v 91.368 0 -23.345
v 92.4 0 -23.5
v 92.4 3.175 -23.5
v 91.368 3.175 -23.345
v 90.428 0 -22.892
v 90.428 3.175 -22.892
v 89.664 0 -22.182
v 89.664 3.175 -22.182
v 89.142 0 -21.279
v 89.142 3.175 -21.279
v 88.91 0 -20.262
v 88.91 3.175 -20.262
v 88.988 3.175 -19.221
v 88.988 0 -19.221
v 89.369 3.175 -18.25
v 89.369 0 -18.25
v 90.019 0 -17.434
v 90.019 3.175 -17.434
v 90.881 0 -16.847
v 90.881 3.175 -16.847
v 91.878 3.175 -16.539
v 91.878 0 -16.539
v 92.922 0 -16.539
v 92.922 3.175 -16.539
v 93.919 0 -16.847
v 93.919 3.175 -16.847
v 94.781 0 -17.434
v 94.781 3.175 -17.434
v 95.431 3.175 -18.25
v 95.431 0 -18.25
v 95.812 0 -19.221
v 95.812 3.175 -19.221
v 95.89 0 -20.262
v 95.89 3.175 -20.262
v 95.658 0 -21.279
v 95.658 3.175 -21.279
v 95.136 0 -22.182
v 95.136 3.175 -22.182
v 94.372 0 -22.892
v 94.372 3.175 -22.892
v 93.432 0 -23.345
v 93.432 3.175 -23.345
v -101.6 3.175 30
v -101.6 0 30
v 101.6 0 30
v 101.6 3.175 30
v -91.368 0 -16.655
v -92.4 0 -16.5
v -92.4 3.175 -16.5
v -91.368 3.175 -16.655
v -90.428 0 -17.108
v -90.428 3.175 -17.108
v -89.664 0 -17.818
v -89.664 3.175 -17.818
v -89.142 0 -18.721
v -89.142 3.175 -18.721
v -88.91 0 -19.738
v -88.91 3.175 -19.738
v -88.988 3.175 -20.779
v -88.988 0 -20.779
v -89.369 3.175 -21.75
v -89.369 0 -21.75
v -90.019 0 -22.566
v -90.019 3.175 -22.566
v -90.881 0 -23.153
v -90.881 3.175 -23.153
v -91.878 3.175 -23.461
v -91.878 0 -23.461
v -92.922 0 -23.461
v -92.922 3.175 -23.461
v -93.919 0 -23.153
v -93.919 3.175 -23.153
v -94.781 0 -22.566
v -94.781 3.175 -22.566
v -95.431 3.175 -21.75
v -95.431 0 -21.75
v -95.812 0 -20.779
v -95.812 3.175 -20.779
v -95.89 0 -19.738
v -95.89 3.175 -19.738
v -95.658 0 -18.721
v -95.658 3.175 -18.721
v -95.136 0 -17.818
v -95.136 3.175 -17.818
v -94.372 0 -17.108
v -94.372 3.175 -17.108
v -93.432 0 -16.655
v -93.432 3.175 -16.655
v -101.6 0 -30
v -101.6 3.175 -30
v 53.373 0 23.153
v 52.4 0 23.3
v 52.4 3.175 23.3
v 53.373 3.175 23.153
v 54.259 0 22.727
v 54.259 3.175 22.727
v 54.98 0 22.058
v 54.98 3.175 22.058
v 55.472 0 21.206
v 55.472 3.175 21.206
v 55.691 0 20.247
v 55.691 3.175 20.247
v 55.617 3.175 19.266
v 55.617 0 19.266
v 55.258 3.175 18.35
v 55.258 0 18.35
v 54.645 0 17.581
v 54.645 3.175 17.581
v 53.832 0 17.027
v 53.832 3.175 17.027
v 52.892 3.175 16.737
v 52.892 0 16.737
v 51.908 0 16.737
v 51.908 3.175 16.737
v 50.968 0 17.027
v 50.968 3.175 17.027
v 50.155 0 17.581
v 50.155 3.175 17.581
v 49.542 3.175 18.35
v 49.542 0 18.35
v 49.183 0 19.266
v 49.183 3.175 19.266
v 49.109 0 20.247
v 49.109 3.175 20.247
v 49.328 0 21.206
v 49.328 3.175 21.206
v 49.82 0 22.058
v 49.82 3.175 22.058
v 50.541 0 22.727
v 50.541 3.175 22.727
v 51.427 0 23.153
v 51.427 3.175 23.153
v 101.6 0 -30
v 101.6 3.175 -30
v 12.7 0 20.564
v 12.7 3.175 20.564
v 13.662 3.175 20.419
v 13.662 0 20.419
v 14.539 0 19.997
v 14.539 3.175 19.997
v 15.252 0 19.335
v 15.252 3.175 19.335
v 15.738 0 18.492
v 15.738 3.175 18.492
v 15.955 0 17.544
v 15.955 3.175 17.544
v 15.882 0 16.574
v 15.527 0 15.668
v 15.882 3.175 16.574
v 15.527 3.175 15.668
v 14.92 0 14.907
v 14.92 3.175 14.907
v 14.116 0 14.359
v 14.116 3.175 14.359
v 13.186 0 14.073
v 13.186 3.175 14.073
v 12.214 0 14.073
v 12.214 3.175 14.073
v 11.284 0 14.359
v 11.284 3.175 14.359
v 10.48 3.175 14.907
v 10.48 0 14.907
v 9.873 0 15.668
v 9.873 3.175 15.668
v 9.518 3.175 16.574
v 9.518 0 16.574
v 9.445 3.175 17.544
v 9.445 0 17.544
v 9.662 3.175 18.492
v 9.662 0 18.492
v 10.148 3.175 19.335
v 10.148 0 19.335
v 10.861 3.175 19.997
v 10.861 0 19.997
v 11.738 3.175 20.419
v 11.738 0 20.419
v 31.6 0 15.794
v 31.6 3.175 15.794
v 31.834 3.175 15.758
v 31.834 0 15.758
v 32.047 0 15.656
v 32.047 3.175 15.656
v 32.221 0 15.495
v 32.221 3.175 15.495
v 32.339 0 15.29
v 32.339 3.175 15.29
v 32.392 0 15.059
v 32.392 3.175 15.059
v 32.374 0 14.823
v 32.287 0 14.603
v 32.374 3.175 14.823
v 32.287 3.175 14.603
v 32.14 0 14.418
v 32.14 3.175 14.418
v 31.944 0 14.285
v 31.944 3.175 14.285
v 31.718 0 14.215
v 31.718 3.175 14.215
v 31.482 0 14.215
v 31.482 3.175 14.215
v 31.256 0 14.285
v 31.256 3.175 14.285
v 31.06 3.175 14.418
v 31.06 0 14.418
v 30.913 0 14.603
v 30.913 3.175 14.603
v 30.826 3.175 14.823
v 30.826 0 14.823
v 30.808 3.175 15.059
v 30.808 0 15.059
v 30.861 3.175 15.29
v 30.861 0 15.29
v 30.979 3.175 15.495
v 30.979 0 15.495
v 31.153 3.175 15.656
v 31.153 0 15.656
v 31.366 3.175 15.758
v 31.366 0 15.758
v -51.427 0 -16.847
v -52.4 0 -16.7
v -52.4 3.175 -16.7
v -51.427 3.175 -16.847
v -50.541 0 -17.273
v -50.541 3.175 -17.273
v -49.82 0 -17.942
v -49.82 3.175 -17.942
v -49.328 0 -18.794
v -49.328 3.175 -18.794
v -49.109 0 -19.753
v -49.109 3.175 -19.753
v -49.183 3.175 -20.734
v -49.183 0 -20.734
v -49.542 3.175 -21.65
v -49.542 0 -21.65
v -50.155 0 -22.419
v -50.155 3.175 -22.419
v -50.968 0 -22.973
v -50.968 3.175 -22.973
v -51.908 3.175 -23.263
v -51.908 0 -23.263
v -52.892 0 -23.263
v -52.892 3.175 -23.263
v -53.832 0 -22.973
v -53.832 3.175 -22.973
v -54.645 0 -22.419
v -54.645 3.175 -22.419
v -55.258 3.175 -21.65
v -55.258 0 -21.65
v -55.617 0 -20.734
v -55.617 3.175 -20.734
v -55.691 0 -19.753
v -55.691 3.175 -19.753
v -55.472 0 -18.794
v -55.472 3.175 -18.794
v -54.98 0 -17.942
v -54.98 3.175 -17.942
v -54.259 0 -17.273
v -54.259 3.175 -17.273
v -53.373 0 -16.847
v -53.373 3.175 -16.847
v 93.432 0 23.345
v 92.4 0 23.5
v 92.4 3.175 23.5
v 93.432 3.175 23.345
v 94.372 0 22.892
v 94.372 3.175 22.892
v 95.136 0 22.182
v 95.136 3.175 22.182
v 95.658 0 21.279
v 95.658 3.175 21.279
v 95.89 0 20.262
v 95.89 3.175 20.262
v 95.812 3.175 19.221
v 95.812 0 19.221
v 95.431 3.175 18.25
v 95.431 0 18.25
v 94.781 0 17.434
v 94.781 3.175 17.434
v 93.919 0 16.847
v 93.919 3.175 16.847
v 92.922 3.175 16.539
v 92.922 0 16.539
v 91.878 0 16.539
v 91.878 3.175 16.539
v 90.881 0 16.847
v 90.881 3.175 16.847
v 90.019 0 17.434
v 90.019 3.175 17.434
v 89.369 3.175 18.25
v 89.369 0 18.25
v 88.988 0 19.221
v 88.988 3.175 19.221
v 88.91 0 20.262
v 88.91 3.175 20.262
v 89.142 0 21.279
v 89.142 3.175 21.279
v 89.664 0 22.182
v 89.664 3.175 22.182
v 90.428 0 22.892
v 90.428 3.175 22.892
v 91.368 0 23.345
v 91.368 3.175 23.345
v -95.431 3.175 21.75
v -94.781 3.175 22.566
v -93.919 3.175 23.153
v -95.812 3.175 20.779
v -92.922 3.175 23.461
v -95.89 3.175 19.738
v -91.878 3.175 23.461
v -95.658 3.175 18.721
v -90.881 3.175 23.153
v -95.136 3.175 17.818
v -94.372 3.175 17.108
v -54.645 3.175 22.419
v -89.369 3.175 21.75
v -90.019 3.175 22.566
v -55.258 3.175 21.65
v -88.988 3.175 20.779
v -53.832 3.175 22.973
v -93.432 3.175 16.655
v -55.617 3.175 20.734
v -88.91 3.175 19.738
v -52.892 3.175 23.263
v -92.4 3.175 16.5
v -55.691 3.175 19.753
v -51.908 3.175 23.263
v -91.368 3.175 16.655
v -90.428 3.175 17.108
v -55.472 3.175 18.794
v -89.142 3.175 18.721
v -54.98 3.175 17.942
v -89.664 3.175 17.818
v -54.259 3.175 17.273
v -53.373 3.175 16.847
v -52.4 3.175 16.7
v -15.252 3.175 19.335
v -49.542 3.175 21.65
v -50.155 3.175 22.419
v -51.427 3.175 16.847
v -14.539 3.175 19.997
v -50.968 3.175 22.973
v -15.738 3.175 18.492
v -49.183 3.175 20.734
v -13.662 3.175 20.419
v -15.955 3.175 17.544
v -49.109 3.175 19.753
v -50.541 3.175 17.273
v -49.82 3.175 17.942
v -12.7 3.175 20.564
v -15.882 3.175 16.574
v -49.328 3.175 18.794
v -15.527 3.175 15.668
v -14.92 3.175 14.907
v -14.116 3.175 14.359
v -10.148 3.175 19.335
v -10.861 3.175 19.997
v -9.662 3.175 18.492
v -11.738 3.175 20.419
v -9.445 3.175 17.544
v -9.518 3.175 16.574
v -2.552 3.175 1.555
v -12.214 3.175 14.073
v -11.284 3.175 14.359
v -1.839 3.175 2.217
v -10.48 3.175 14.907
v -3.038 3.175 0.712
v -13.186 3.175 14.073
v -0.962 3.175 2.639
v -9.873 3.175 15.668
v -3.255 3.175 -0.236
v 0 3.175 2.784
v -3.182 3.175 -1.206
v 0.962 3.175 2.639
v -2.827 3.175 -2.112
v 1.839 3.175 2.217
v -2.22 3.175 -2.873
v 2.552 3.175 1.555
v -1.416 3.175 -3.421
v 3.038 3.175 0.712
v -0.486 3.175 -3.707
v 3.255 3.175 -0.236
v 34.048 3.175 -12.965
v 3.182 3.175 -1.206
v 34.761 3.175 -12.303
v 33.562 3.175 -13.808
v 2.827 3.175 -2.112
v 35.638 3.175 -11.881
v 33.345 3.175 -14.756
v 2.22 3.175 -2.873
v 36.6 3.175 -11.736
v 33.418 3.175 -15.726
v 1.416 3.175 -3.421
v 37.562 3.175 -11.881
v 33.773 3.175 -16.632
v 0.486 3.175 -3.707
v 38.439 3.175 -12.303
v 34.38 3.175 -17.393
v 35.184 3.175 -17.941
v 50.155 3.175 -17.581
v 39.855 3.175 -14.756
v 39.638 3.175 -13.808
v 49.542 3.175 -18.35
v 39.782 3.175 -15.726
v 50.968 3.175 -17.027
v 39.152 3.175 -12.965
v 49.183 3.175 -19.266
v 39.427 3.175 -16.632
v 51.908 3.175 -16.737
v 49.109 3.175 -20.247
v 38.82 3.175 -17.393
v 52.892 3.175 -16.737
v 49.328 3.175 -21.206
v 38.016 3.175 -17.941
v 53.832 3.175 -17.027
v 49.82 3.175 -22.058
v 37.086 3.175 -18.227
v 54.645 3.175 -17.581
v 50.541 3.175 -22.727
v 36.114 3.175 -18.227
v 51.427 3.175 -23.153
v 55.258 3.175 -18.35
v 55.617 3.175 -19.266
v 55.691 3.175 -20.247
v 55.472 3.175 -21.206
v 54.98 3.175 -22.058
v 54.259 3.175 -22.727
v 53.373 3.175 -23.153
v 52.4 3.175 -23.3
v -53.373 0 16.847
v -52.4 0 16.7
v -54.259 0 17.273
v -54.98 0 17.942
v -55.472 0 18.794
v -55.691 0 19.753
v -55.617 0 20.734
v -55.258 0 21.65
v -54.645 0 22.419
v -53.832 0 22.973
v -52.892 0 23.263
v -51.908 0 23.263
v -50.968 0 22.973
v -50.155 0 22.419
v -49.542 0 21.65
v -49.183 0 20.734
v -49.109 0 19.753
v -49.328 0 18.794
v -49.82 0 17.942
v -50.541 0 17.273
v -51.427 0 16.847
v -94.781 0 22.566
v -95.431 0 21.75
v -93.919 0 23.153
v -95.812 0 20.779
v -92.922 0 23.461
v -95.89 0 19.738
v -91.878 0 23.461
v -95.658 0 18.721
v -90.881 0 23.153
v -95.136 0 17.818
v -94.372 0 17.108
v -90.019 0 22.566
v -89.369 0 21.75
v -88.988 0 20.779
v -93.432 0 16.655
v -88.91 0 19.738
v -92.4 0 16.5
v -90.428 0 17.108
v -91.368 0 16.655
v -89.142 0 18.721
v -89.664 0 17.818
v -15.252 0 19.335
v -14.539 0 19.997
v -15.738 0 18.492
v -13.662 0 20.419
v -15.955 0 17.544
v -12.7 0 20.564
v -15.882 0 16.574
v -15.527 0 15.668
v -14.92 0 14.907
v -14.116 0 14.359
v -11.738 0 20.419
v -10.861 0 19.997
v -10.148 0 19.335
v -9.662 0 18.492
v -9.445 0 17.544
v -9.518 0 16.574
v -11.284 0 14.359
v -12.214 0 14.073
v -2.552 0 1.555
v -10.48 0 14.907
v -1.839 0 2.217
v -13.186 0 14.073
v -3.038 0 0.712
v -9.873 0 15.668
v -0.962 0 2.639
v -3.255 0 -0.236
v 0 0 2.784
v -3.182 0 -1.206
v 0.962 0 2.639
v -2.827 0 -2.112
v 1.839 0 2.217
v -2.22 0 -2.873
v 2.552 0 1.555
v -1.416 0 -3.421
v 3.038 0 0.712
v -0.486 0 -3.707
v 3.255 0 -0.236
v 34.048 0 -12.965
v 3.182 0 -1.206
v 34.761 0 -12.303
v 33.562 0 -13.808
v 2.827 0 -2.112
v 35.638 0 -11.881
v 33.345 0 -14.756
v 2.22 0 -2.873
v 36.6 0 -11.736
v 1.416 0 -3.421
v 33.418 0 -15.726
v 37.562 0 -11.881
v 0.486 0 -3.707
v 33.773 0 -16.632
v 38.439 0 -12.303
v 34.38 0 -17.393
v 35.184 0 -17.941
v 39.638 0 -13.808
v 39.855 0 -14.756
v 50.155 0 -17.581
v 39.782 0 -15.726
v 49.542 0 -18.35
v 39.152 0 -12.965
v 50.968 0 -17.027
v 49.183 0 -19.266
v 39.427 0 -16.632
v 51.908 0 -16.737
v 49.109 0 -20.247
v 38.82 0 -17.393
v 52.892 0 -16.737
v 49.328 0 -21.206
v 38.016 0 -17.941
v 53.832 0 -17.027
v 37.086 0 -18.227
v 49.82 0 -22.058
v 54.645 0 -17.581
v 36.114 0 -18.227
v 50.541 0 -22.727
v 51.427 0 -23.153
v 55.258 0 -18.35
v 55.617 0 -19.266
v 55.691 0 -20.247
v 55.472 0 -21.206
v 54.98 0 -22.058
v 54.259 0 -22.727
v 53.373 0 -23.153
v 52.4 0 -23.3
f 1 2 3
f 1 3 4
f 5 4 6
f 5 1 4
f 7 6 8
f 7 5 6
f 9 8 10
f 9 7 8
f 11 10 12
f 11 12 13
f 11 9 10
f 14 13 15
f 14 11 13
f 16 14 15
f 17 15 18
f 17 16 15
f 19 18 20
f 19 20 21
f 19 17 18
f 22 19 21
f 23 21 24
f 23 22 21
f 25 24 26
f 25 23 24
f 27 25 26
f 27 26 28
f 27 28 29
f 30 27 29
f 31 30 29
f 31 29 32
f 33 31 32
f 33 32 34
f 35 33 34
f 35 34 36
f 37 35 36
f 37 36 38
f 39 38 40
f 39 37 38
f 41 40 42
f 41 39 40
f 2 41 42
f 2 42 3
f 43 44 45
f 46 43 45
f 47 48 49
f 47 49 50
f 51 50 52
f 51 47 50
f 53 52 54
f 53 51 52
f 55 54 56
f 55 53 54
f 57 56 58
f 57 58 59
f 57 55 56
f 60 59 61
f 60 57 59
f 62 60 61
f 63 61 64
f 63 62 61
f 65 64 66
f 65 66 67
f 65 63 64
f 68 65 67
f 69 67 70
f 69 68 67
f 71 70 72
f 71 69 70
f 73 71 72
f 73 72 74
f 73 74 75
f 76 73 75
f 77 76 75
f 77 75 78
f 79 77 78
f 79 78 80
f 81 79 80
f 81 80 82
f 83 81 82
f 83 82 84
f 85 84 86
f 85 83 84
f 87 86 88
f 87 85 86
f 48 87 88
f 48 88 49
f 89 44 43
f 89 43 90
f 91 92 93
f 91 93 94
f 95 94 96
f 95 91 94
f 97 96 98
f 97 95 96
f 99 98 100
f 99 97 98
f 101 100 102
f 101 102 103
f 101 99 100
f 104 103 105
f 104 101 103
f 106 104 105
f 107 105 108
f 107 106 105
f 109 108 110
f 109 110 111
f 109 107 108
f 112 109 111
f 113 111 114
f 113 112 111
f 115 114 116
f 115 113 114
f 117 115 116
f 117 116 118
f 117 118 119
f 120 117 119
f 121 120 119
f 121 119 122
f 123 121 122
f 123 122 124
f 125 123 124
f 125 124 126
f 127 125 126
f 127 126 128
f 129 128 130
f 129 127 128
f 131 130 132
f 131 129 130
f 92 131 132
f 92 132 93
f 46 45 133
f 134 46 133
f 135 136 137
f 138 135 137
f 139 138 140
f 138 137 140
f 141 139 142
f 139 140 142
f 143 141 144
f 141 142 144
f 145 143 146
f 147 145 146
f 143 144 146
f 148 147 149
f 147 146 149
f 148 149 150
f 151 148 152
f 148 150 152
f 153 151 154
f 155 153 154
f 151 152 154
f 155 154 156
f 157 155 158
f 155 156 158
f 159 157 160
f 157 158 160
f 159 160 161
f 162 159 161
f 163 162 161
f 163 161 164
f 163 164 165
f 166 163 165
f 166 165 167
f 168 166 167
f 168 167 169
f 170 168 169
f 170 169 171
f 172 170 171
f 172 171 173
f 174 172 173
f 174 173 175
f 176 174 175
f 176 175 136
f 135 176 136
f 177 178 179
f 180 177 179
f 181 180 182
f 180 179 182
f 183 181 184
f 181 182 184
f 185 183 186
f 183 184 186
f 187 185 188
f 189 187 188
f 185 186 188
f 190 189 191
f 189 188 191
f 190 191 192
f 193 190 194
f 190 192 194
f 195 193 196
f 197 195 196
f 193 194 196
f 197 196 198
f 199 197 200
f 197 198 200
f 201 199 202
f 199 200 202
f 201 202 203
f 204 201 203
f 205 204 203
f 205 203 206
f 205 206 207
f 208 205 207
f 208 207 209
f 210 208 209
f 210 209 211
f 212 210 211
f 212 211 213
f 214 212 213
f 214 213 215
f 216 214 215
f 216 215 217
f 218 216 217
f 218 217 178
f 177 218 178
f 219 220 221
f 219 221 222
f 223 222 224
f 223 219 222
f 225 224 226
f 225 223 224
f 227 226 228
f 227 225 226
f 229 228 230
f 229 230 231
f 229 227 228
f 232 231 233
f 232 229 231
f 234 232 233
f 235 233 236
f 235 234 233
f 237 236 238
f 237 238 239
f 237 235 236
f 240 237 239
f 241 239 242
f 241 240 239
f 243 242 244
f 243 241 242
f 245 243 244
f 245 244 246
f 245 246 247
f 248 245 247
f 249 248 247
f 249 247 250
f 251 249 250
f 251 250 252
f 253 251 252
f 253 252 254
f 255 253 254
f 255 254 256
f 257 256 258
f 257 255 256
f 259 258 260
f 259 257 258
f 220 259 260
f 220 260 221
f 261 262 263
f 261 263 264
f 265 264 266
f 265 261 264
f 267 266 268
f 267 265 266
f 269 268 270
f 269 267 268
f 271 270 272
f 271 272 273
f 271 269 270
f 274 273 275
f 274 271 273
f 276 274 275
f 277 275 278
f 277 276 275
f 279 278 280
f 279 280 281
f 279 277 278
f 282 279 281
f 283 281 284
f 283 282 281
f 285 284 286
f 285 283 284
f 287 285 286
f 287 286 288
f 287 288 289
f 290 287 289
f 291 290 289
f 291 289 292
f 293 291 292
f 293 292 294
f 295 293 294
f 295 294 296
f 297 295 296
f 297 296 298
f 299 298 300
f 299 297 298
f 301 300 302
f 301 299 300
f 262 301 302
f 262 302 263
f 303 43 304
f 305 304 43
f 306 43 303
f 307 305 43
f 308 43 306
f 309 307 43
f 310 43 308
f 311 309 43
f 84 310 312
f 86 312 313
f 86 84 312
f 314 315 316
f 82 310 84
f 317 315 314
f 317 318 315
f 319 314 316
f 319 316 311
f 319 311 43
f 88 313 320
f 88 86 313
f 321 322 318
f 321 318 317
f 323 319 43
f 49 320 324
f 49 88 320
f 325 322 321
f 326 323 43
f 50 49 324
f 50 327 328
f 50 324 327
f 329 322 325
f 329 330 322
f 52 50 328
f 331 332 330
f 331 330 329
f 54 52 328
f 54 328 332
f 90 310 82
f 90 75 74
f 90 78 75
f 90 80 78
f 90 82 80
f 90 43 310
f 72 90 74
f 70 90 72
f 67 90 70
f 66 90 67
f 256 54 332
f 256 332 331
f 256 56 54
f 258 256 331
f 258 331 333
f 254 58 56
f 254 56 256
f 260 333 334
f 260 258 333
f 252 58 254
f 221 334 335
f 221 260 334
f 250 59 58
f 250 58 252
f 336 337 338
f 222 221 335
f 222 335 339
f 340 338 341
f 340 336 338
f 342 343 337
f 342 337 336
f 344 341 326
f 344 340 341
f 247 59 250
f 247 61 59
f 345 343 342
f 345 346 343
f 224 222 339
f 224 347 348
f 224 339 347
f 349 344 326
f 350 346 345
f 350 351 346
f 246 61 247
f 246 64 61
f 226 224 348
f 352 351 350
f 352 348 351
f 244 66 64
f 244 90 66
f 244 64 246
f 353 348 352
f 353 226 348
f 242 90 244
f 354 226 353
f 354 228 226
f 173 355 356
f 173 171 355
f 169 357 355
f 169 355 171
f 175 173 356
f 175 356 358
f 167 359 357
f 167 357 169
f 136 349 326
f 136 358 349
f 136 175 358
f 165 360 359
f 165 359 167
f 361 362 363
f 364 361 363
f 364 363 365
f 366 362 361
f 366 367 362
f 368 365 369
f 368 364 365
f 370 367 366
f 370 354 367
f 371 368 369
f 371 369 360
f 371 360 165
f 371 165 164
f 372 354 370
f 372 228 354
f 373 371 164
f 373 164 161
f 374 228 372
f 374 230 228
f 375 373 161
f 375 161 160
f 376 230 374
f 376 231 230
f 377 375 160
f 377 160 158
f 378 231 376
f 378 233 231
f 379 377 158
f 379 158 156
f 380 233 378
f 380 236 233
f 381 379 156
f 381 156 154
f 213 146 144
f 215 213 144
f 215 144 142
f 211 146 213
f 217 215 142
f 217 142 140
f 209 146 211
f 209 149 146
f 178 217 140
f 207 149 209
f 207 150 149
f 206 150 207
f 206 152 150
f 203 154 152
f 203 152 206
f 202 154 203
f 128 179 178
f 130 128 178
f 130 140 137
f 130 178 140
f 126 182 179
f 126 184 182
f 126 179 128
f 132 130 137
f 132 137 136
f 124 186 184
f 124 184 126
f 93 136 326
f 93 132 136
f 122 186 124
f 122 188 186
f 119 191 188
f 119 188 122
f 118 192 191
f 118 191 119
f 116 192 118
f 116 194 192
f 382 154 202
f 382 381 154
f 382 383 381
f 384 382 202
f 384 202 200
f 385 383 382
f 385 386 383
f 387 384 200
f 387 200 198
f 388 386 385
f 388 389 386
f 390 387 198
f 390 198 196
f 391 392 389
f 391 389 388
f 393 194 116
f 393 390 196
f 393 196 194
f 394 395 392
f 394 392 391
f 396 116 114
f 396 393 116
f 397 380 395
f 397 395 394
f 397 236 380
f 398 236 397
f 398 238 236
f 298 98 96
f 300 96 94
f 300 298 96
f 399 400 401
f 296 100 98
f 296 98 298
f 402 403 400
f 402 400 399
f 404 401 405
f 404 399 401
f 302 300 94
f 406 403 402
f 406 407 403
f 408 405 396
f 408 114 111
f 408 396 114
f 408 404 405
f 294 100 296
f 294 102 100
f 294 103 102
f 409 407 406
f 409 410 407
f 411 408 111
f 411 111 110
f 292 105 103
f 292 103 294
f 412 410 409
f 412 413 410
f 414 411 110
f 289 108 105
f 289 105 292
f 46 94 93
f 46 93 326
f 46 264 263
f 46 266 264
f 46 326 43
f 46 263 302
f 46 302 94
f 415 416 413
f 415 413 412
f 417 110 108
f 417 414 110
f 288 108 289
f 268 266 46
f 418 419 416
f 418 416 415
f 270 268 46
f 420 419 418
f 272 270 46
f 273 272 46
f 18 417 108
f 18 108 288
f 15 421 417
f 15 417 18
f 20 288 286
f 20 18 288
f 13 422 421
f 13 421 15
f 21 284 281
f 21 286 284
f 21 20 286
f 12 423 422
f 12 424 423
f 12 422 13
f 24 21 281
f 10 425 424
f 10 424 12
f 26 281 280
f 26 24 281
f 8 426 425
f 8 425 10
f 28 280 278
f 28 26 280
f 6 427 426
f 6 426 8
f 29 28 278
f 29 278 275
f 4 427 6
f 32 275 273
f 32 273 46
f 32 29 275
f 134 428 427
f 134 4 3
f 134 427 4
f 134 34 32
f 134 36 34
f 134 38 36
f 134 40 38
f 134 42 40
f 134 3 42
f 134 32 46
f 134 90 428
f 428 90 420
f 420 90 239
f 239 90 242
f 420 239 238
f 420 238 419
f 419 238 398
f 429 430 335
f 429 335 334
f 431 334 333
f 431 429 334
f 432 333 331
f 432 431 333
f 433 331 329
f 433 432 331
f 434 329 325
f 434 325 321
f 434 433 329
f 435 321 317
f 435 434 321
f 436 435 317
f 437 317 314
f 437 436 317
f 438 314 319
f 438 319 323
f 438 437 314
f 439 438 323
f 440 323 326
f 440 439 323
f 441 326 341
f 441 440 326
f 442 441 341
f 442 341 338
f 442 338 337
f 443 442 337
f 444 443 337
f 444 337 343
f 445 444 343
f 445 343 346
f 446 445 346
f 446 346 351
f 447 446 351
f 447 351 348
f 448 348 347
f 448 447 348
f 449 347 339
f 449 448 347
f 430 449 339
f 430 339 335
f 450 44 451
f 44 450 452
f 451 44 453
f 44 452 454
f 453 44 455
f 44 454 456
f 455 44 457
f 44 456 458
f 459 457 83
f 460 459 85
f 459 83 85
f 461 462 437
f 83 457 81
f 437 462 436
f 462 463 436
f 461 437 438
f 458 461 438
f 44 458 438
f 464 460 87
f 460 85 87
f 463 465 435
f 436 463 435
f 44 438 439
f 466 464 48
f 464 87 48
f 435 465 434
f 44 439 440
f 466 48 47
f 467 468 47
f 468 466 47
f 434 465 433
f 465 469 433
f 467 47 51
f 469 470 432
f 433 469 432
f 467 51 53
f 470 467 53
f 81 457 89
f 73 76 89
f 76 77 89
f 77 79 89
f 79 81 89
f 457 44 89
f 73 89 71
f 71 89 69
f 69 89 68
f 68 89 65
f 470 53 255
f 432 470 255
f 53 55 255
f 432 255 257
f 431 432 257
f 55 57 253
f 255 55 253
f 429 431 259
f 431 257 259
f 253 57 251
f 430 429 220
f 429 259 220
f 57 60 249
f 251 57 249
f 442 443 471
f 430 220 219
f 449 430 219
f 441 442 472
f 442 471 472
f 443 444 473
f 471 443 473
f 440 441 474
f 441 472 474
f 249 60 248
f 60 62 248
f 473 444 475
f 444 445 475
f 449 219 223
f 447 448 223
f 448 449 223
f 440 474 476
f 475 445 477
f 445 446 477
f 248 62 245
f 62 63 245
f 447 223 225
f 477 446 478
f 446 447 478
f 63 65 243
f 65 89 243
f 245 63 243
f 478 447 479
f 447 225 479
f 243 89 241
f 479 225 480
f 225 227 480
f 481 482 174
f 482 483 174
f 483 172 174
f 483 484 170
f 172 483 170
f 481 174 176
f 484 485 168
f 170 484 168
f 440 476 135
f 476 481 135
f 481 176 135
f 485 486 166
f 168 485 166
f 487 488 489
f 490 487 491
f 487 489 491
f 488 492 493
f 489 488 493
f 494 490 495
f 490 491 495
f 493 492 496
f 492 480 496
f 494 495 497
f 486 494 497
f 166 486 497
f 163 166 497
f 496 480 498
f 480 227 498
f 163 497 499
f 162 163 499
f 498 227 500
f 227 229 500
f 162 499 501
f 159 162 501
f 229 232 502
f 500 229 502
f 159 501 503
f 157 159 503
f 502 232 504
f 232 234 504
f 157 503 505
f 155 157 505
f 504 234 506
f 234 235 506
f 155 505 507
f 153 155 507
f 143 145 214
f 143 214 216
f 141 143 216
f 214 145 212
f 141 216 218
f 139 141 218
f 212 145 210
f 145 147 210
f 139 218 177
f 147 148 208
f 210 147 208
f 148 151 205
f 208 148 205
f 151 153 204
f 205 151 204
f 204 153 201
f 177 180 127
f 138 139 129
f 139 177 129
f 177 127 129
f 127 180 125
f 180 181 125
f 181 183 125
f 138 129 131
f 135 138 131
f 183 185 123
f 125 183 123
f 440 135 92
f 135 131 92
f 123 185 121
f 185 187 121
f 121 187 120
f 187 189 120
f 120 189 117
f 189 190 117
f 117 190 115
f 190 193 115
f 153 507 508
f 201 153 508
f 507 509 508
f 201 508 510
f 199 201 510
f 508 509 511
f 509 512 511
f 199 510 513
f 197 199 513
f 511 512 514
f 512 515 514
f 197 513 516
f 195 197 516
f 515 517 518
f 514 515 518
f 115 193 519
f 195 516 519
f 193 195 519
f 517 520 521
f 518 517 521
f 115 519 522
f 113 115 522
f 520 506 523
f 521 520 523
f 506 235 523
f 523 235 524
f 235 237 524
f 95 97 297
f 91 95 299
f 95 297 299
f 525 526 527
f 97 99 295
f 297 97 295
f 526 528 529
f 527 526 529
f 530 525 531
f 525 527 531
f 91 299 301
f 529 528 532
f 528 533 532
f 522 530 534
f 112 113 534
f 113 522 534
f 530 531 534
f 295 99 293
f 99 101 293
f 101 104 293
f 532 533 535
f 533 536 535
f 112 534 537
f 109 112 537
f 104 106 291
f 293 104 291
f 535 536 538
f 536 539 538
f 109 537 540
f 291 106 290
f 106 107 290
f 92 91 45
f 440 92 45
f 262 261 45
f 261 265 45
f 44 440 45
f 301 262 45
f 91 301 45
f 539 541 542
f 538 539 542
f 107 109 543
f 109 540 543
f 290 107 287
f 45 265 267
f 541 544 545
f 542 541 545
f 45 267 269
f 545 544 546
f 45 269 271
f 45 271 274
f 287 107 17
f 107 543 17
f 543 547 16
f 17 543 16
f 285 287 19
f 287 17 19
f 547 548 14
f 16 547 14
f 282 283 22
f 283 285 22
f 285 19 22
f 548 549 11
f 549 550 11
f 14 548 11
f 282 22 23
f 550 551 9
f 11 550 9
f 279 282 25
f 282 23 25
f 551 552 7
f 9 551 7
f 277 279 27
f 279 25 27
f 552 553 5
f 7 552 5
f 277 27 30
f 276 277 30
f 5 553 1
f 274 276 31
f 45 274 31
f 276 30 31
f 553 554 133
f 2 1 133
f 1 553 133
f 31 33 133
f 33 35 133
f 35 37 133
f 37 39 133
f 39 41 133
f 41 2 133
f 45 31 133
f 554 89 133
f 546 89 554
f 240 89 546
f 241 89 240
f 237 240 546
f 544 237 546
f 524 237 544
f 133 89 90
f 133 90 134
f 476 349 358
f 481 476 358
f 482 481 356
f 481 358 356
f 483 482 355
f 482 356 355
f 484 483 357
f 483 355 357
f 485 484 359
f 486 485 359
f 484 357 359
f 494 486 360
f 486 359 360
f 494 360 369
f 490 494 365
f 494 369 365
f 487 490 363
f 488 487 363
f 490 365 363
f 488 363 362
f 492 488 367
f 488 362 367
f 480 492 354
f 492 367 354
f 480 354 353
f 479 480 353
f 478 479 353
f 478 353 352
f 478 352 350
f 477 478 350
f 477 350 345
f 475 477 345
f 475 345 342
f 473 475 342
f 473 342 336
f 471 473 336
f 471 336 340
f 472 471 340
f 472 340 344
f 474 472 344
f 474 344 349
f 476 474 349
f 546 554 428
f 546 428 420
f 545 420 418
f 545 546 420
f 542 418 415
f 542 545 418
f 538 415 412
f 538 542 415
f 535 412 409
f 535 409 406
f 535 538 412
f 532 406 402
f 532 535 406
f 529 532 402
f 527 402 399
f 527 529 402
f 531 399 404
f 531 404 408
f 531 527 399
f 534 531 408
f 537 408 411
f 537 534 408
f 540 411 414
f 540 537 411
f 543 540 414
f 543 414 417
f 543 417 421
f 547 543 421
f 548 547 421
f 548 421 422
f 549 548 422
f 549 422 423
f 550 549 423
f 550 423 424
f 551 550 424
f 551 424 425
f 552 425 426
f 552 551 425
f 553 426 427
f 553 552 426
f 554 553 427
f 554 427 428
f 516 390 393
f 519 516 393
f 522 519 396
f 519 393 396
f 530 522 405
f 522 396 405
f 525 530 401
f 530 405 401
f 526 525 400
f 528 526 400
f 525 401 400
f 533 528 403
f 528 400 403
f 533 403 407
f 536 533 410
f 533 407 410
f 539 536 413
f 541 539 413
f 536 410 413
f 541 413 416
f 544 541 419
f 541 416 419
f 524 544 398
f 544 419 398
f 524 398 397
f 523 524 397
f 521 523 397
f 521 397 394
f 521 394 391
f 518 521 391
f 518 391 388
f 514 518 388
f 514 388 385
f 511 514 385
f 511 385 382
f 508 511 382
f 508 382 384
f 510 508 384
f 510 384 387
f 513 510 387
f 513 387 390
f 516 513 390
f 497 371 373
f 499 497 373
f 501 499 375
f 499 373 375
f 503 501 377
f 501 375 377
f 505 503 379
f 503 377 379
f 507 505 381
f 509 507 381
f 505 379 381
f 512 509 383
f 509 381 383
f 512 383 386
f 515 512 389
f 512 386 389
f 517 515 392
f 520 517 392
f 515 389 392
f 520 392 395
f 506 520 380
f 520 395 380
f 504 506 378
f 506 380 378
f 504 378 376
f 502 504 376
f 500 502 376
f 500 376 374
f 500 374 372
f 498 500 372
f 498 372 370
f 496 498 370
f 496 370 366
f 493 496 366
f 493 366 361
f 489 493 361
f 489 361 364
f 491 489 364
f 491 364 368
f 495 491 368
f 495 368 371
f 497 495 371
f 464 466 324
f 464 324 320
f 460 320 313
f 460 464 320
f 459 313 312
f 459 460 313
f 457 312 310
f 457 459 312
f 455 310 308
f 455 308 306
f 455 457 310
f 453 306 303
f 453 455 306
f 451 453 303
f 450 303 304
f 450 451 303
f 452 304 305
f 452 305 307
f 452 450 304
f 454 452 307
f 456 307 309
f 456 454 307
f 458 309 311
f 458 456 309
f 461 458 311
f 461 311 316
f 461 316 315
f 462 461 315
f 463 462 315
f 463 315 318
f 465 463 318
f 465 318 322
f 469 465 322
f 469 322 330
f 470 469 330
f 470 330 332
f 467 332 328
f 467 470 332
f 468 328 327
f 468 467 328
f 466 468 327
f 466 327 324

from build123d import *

# Parameters (mm, degrees)
SKETCH1_W                      = 203.2
SKETCH1_H                      = 60
SKETCH1_R                      = 3.3
SKETCH1_R_2                    = 3.5
BOSS_EXTRUDE1_DEPTH            = 3.175
SKETCH2_R                      = 3.2639
F_1_4_20_FOR_NUT_BRACKET_DEPTH = 106.984152707
SKETCH3_R                      = 0.79375
SKETCH3_R_2                    = 3.2639
WIRE_HOLDER_DEPTH              = 106.984152707


with BuildPart() as part:
    # Sketch1 → Boss-Extrude1 (new body)
    with BuildSketch(Plane(origin=(0, 0, 0), x_dir=(1, 0, 0), z_dir=(0, 1, 0))):
        Rectangle(SKETCH1_W, SKETCH1_H)
        with Locations(Location((-52.4, 20, 0), (0, 0, 270))):
            Circle(SKETCH1_R, mode=Mode.SUBTRACT)
        with Locations(Location((-92.4, -20, 0), (0, 0, 90))):
            Circle(SKETCH1_R_2, mode=Mode.SUBTRACT)
        with Locations(Location((-52.4, -20, 0), (0, 0, 90))):
            Circle(SKETCH1_R, mode=Mode.SUBTRACT)
        with Locations(Location((92.4, 20, 0), (0, 0, 90))):
            Circle(SKETCH1_R_2, mode=Mode.SUBTRACT)
        with Locations(Location((-92.4, 20, 0), (0, 0, 270))):
            Circle(SKETCH1_R_2, mode=Mode.SUBTRACT)
        with Locations(Location((52.4, -20, 0), (0, 0, 270))):
            Circle(SKETCH1_R, mode=Mode.SUBTRACT)
        with Locations(Location((92.4, -20, 0), (0, 0, 270))):
            Circle(SKETCH1_R_2, mode=Mode.SUBTRACT)
        with Locations(Location((52.4, 20, 0), (0, 0, 90))):
            Circle(SKETCH1_R, mode=Mode.SUBTRACT)
    extrude(amount=BOSS_EXTRUDE1_DEPTH)

    # Sketch2 → 1/4-20 for Nut Bracket (cut, through all)
    with BuildSketch(Plane(origin=(0, 3.175, 0), x_dir=(1, 0, 0), z_dir=(0, 1, 0))):
        with Locations(Location((-12.7, -17.3, 0), (0, 0, 270))):
            Circle(SKETCH2_R)
        with Locations(Location((12.7, -17.3, 0), (0, 0, 270))):
            Circle(SKETCH2_R)
        with Locations(Location((0, 0.48, 0), (0, 0, 270))):
            Circle(SKETCH2_R)
    extrude(amount=-F_1_4_20_FOR_NUT_BRACKET_DEPTH, mode=Mode.SUBTRACT)

    # Sketch3 → Wire Holder (cut, through all)
    with BuildSketch(Plane(origin=(0, 3.175, 0), x_dir=(1, 0, 0), z_dir=(0, 1, 0))):
        with Locations(Location((31.6, -15, 0), (0, 0, 270))):
            Circle(SKETCH3_R)
        with Locations(Location((36.6, 15, 0), (0, 0, 270))):
            Circle(SKETCH3_R_2)
    extrude(amount=-WIRE_HOLDER_DEPTH, mode=Mode.SUBTRACT)


solid = part.part
